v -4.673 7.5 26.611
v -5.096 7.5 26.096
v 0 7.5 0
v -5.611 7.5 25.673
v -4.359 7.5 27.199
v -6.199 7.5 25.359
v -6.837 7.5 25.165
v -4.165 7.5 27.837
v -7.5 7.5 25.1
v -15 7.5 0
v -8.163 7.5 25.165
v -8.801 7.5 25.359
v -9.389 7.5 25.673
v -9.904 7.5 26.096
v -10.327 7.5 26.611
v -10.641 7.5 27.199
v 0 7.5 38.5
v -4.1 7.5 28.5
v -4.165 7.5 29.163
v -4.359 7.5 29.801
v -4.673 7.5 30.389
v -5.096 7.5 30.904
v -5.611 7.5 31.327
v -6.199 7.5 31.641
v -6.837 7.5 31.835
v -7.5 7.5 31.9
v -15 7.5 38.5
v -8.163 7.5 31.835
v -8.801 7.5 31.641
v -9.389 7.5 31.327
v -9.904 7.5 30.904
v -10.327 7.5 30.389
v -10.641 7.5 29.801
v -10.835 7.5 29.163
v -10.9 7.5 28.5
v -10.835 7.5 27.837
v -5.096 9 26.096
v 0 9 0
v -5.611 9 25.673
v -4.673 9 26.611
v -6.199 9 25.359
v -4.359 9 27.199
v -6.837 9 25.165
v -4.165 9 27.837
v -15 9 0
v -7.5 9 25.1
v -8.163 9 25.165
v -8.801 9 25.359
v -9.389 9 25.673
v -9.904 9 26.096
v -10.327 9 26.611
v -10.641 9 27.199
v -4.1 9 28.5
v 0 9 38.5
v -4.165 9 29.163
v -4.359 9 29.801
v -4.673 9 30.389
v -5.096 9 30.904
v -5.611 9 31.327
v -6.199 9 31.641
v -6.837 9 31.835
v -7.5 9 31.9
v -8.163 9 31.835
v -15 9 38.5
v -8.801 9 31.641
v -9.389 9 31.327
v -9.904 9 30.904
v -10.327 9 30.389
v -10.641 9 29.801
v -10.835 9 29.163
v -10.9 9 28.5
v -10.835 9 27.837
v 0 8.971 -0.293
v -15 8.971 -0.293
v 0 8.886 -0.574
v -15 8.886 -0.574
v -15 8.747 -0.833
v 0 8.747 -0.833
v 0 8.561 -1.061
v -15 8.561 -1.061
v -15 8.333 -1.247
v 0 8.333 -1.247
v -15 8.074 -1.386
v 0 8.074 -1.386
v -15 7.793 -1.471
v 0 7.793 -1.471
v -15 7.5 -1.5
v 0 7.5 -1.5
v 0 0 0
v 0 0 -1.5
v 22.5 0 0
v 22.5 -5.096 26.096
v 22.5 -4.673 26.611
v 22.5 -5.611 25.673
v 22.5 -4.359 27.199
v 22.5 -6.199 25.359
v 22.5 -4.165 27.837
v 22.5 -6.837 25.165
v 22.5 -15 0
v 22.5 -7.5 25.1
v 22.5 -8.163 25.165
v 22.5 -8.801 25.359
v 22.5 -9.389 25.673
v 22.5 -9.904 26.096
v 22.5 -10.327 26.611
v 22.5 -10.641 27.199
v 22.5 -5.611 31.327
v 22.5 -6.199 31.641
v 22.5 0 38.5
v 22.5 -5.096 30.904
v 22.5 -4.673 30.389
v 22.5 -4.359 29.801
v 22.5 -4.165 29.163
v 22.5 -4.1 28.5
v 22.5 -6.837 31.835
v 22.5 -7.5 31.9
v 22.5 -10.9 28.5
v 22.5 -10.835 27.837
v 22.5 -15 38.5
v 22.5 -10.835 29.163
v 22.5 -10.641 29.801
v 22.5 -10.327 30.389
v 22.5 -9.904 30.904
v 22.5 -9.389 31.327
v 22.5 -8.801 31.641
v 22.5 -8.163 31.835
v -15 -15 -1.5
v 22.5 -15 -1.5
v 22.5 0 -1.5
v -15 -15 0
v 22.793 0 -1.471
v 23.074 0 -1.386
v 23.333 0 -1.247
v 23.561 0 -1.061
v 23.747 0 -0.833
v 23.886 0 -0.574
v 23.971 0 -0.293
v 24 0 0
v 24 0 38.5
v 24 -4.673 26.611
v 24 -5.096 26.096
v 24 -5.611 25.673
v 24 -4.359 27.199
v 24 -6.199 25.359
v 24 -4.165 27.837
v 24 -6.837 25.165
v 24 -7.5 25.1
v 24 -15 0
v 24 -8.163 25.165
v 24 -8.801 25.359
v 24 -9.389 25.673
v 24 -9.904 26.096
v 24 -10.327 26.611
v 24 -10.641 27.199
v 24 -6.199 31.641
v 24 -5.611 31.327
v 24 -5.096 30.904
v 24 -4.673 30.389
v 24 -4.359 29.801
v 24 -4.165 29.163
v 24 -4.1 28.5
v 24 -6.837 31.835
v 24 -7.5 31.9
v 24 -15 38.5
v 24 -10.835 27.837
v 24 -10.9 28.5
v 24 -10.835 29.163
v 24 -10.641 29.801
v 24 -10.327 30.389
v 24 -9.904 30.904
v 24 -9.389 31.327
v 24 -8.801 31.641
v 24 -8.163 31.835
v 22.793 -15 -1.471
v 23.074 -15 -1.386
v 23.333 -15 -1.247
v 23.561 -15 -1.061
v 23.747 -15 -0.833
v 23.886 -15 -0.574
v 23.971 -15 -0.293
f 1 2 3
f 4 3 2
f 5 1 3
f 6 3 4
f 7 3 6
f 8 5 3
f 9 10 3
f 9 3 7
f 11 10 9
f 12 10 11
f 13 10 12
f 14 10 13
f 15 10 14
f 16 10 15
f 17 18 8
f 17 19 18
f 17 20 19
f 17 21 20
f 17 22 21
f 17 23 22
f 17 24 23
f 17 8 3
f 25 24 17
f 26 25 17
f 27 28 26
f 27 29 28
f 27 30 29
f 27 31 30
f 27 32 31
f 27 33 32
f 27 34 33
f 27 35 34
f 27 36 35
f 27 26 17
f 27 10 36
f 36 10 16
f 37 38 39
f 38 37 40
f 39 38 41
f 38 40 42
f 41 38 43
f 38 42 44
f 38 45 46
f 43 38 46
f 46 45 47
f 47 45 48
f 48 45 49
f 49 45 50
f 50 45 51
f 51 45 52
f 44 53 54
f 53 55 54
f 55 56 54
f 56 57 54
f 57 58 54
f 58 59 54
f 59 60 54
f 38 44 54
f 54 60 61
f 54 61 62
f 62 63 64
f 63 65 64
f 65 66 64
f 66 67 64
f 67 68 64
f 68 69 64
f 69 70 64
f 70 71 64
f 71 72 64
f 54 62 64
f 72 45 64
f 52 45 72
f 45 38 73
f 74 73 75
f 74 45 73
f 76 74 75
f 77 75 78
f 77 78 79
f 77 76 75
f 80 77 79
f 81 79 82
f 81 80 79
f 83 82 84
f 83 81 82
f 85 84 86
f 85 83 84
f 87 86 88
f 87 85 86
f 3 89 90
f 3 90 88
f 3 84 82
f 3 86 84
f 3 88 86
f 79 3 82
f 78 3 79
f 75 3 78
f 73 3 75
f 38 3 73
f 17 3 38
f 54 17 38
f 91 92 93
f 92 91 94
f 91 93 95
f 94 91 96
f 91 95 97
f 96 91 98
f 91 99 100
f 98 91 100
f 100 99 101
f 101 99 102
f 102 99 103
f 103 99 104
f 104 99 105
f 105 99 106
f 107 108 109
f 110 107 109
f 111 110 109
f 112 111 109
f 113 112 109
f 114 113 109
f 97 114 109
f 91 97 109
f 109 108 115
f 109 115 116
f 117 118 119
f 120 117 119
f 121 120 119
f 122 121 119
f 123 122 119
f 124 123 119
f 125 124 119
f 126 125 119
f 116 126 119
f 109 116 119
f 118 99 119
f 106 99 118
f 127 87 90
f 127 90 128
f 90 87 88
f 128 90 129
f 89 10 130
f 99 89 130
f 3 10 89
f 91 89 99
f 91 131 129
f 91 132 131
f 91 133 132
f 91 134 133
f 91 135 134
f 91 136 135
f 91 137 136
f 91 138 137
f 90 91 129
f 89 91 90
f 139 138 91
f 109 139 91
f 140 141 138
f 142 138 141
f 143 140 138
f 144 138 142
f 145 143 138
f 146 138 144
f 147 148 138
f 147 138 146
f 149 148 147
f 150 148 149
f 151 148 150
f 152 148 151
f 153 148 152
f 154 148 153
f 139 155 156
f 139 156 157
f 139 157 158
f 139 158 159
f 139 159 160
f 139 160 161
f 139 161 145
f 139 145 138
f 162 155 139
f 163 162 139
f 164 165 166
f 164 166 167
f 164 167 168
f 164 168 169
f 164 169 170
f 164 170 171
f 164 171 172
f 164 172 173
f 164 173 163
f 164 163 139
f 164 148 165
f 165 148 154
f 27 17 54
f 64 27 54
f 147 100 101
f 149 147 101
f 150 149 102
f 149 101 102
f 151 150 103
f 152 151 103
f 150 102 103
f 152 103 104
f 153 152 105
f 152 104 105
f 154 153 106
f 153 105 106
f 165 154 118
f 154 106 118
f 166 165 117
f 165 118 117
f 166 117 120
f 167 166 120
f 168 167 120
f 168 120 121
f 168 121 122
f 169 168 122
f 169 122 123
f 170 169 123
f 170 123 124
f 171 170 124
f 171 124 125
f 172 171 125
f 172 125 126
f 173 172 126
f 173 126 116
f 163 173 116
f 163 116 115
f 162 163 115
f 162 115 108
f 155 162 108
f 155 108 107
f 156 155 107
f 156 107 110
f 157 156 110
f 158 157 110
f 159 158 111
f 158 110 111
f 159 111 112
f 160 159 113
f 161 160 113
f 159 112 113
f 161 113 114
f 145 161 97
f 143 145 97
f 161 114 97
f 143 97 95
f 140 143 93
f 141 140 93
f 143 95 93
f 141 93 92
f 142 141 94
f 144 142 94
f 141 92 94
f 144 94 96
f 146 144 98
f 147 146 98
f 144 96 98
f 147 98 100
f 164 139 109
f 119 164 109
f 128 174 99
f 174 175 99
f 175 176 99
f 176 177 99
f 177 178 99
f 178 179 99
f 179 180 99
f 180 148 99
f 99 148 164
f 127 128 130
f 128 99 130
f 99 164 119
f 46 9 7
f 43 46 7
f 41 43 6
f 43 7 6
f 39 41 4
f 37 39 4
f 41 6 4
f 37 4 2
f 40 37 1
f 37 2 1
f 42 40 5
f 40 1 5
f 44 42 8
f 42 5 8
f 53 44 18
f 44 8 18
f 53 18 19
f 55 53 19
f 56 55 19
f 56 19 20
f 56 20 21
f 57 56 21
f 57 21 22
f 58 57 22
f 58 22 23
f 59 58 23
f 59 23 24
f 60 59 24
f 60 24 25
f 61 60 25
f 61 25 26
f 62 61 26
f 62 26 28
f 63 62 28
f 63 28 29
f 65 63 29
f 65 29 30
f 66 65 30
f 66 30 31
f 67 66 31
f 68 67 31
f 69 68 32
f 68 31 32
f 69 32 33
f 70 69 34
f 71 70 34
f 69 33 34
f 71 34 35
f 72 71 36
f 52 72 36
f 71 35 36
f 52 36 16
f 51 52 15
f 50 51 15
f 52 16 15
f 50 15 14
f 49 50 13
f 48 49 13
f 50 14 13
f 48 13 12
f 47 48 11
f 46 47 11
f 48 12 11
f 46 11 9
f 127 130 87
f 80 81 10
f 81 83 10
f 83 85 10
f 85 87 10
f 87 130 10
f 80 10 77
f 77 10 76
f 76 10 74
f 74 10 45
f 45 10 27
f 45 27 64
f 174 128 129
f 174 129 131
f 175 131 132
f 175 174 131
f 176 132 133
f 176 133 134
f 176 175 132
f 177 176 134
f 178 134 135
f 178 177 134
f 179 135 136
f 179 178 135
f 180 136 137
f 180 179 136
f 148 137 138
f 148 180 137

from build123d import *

# Parameters (mm, degrees)
BASE_FLANGIA1_DEPTH             = 1.5
BORDO_FLANGIA1_START            = -24
BORDO_FLANGIA1_OUTLINE_W        = 1.5
BORDO_FLANGIA1_OUTLINE_H        = 38.5
BORDO_FLANGIA1_DEPTH            = 15
BORDO_FLANGIA1_START_2          = -15
BORDO_FLANGIA1_2_OUTLINE_W      = 1.5
BORDO_FLANGIA1_2_OUTLINE_H      = 38.5
BORDO_FLANGIA1_2_DEPTH          = 15
BORDO_FLANGIA1_3_DEPTH          = 15
BORDO_FLANGIA1_4_DEPTH          = 15
FORO_FILETTATO_M8_1_D           = 6.8
FORO_FILETTATO_M8_1_ON_FACE_2_D = 6.8


# Read off the part's stored shape, not the designer's step: Schizzo10
# Sheet-metal steps are written as plain solids
with BuildPart() as part:
    # Schizzo1 → Base-Flangia1 (new body)
    with BuildSketch(Plane.XY):
        Polygon((0, 0), (0, 9), (-15, 9), (-15, -15), (24, -15), (24, 0), align=None)
    extrude(amount=-BASE_FLANGIA1_DEPTH)

    # Bordo-Flangia1 outline → Bordo-Flangia1 (add)
    with BuildSketch(Plane(origin=(0, 9, 0), x_dir=(-1, 0, 0), z_dir=(0, 1, 0)).offset(BORDO_FLANGIA1_START)):
        with Locations((-23.25, 19.25)):
            Rectangle(BORDO_FLANGIA1_OUTLINE_W, BORDO_FLANGIA1_OUTLINE_H)
    extrude(amount=BORDO_FLANGIA1_DEPTH)

    # Bordo-Flangia1 2 outline → Bordo-Flangia1 2 (add)
    with BuildSketch(Plane.YZ.offset(BORDO_FLANGIA1_START_2)):
        with Locations((8.25, 19.25)):
            Rectangle(BORDO_FLANGIA1_2_OUTLINE_W, BORDO_FLANGIA1_2_OUTLINE_H)
    extrude(amount=BORDO_FLANGIA1_2_DEPTH)

    # Bordo-Flangia1 3 outline → Bordo-Flangia1 3 (cut)
    with BuildSketch(Plane(origin=(0, 9, 0), x_dir=(-1, 0, 0), z_dir=(0, 1, 0)).offset(BORDO_FLANGIA1_START)):
        with BuildLine():
            ThreePointArc((-22.5, -1.5), (-23.560660172, -1.060660172), (-24, 0))
            Line((-24, 0), (-24, -1.5))
            Line((-24, -1.5), (-22.5, -1.5))
        make_face()
    extrude(amount=BORDO_FLANGIA1_3_DEPTH, mode=Mode.SUBTRACT)

    # Bordo-Flangia1 4 outline → Bordo-Flangia1 4 (cut)
    with BuildSketch(Plane.YZ.offset(BORDO_FLANGIA1_START_2)):
        with BuildLine():
            ThreePointArc((9, 0), (8.560660172, -1.060660172), (7.5, -1.5))
            Line((7.5, -1.5), (9, -1.5))
            Line((9, -1.5), (9, 0))
        make_face()
    extrude(amount=BORDO_FLANGIA1_4_DEPTH, mode=Mode.SUBTRACT)

    # Foro filettato M8-1 (through all)
    with Locations(Plane(origin=(-7.5, 9, 28.5), x_dir=(0, 0, 1), z_dir=(0, 1, 0))):
        with Locations((0, 0)):
            Hole(FORO_FILETTATO_M8_1_D / 2)

    # Foro filettato M8-1 on face 2 (through all)
    with Locations(Plane(origin=(24, -7.5, 28.5), x_dir=(0, 0, 1), z_dir=(1, 0, 0))):
        with Locations((0, 0)):
            Hole(FORO_FILETTATO_M8_1_ON_FACE_2_D / 2)


solid = part.part
